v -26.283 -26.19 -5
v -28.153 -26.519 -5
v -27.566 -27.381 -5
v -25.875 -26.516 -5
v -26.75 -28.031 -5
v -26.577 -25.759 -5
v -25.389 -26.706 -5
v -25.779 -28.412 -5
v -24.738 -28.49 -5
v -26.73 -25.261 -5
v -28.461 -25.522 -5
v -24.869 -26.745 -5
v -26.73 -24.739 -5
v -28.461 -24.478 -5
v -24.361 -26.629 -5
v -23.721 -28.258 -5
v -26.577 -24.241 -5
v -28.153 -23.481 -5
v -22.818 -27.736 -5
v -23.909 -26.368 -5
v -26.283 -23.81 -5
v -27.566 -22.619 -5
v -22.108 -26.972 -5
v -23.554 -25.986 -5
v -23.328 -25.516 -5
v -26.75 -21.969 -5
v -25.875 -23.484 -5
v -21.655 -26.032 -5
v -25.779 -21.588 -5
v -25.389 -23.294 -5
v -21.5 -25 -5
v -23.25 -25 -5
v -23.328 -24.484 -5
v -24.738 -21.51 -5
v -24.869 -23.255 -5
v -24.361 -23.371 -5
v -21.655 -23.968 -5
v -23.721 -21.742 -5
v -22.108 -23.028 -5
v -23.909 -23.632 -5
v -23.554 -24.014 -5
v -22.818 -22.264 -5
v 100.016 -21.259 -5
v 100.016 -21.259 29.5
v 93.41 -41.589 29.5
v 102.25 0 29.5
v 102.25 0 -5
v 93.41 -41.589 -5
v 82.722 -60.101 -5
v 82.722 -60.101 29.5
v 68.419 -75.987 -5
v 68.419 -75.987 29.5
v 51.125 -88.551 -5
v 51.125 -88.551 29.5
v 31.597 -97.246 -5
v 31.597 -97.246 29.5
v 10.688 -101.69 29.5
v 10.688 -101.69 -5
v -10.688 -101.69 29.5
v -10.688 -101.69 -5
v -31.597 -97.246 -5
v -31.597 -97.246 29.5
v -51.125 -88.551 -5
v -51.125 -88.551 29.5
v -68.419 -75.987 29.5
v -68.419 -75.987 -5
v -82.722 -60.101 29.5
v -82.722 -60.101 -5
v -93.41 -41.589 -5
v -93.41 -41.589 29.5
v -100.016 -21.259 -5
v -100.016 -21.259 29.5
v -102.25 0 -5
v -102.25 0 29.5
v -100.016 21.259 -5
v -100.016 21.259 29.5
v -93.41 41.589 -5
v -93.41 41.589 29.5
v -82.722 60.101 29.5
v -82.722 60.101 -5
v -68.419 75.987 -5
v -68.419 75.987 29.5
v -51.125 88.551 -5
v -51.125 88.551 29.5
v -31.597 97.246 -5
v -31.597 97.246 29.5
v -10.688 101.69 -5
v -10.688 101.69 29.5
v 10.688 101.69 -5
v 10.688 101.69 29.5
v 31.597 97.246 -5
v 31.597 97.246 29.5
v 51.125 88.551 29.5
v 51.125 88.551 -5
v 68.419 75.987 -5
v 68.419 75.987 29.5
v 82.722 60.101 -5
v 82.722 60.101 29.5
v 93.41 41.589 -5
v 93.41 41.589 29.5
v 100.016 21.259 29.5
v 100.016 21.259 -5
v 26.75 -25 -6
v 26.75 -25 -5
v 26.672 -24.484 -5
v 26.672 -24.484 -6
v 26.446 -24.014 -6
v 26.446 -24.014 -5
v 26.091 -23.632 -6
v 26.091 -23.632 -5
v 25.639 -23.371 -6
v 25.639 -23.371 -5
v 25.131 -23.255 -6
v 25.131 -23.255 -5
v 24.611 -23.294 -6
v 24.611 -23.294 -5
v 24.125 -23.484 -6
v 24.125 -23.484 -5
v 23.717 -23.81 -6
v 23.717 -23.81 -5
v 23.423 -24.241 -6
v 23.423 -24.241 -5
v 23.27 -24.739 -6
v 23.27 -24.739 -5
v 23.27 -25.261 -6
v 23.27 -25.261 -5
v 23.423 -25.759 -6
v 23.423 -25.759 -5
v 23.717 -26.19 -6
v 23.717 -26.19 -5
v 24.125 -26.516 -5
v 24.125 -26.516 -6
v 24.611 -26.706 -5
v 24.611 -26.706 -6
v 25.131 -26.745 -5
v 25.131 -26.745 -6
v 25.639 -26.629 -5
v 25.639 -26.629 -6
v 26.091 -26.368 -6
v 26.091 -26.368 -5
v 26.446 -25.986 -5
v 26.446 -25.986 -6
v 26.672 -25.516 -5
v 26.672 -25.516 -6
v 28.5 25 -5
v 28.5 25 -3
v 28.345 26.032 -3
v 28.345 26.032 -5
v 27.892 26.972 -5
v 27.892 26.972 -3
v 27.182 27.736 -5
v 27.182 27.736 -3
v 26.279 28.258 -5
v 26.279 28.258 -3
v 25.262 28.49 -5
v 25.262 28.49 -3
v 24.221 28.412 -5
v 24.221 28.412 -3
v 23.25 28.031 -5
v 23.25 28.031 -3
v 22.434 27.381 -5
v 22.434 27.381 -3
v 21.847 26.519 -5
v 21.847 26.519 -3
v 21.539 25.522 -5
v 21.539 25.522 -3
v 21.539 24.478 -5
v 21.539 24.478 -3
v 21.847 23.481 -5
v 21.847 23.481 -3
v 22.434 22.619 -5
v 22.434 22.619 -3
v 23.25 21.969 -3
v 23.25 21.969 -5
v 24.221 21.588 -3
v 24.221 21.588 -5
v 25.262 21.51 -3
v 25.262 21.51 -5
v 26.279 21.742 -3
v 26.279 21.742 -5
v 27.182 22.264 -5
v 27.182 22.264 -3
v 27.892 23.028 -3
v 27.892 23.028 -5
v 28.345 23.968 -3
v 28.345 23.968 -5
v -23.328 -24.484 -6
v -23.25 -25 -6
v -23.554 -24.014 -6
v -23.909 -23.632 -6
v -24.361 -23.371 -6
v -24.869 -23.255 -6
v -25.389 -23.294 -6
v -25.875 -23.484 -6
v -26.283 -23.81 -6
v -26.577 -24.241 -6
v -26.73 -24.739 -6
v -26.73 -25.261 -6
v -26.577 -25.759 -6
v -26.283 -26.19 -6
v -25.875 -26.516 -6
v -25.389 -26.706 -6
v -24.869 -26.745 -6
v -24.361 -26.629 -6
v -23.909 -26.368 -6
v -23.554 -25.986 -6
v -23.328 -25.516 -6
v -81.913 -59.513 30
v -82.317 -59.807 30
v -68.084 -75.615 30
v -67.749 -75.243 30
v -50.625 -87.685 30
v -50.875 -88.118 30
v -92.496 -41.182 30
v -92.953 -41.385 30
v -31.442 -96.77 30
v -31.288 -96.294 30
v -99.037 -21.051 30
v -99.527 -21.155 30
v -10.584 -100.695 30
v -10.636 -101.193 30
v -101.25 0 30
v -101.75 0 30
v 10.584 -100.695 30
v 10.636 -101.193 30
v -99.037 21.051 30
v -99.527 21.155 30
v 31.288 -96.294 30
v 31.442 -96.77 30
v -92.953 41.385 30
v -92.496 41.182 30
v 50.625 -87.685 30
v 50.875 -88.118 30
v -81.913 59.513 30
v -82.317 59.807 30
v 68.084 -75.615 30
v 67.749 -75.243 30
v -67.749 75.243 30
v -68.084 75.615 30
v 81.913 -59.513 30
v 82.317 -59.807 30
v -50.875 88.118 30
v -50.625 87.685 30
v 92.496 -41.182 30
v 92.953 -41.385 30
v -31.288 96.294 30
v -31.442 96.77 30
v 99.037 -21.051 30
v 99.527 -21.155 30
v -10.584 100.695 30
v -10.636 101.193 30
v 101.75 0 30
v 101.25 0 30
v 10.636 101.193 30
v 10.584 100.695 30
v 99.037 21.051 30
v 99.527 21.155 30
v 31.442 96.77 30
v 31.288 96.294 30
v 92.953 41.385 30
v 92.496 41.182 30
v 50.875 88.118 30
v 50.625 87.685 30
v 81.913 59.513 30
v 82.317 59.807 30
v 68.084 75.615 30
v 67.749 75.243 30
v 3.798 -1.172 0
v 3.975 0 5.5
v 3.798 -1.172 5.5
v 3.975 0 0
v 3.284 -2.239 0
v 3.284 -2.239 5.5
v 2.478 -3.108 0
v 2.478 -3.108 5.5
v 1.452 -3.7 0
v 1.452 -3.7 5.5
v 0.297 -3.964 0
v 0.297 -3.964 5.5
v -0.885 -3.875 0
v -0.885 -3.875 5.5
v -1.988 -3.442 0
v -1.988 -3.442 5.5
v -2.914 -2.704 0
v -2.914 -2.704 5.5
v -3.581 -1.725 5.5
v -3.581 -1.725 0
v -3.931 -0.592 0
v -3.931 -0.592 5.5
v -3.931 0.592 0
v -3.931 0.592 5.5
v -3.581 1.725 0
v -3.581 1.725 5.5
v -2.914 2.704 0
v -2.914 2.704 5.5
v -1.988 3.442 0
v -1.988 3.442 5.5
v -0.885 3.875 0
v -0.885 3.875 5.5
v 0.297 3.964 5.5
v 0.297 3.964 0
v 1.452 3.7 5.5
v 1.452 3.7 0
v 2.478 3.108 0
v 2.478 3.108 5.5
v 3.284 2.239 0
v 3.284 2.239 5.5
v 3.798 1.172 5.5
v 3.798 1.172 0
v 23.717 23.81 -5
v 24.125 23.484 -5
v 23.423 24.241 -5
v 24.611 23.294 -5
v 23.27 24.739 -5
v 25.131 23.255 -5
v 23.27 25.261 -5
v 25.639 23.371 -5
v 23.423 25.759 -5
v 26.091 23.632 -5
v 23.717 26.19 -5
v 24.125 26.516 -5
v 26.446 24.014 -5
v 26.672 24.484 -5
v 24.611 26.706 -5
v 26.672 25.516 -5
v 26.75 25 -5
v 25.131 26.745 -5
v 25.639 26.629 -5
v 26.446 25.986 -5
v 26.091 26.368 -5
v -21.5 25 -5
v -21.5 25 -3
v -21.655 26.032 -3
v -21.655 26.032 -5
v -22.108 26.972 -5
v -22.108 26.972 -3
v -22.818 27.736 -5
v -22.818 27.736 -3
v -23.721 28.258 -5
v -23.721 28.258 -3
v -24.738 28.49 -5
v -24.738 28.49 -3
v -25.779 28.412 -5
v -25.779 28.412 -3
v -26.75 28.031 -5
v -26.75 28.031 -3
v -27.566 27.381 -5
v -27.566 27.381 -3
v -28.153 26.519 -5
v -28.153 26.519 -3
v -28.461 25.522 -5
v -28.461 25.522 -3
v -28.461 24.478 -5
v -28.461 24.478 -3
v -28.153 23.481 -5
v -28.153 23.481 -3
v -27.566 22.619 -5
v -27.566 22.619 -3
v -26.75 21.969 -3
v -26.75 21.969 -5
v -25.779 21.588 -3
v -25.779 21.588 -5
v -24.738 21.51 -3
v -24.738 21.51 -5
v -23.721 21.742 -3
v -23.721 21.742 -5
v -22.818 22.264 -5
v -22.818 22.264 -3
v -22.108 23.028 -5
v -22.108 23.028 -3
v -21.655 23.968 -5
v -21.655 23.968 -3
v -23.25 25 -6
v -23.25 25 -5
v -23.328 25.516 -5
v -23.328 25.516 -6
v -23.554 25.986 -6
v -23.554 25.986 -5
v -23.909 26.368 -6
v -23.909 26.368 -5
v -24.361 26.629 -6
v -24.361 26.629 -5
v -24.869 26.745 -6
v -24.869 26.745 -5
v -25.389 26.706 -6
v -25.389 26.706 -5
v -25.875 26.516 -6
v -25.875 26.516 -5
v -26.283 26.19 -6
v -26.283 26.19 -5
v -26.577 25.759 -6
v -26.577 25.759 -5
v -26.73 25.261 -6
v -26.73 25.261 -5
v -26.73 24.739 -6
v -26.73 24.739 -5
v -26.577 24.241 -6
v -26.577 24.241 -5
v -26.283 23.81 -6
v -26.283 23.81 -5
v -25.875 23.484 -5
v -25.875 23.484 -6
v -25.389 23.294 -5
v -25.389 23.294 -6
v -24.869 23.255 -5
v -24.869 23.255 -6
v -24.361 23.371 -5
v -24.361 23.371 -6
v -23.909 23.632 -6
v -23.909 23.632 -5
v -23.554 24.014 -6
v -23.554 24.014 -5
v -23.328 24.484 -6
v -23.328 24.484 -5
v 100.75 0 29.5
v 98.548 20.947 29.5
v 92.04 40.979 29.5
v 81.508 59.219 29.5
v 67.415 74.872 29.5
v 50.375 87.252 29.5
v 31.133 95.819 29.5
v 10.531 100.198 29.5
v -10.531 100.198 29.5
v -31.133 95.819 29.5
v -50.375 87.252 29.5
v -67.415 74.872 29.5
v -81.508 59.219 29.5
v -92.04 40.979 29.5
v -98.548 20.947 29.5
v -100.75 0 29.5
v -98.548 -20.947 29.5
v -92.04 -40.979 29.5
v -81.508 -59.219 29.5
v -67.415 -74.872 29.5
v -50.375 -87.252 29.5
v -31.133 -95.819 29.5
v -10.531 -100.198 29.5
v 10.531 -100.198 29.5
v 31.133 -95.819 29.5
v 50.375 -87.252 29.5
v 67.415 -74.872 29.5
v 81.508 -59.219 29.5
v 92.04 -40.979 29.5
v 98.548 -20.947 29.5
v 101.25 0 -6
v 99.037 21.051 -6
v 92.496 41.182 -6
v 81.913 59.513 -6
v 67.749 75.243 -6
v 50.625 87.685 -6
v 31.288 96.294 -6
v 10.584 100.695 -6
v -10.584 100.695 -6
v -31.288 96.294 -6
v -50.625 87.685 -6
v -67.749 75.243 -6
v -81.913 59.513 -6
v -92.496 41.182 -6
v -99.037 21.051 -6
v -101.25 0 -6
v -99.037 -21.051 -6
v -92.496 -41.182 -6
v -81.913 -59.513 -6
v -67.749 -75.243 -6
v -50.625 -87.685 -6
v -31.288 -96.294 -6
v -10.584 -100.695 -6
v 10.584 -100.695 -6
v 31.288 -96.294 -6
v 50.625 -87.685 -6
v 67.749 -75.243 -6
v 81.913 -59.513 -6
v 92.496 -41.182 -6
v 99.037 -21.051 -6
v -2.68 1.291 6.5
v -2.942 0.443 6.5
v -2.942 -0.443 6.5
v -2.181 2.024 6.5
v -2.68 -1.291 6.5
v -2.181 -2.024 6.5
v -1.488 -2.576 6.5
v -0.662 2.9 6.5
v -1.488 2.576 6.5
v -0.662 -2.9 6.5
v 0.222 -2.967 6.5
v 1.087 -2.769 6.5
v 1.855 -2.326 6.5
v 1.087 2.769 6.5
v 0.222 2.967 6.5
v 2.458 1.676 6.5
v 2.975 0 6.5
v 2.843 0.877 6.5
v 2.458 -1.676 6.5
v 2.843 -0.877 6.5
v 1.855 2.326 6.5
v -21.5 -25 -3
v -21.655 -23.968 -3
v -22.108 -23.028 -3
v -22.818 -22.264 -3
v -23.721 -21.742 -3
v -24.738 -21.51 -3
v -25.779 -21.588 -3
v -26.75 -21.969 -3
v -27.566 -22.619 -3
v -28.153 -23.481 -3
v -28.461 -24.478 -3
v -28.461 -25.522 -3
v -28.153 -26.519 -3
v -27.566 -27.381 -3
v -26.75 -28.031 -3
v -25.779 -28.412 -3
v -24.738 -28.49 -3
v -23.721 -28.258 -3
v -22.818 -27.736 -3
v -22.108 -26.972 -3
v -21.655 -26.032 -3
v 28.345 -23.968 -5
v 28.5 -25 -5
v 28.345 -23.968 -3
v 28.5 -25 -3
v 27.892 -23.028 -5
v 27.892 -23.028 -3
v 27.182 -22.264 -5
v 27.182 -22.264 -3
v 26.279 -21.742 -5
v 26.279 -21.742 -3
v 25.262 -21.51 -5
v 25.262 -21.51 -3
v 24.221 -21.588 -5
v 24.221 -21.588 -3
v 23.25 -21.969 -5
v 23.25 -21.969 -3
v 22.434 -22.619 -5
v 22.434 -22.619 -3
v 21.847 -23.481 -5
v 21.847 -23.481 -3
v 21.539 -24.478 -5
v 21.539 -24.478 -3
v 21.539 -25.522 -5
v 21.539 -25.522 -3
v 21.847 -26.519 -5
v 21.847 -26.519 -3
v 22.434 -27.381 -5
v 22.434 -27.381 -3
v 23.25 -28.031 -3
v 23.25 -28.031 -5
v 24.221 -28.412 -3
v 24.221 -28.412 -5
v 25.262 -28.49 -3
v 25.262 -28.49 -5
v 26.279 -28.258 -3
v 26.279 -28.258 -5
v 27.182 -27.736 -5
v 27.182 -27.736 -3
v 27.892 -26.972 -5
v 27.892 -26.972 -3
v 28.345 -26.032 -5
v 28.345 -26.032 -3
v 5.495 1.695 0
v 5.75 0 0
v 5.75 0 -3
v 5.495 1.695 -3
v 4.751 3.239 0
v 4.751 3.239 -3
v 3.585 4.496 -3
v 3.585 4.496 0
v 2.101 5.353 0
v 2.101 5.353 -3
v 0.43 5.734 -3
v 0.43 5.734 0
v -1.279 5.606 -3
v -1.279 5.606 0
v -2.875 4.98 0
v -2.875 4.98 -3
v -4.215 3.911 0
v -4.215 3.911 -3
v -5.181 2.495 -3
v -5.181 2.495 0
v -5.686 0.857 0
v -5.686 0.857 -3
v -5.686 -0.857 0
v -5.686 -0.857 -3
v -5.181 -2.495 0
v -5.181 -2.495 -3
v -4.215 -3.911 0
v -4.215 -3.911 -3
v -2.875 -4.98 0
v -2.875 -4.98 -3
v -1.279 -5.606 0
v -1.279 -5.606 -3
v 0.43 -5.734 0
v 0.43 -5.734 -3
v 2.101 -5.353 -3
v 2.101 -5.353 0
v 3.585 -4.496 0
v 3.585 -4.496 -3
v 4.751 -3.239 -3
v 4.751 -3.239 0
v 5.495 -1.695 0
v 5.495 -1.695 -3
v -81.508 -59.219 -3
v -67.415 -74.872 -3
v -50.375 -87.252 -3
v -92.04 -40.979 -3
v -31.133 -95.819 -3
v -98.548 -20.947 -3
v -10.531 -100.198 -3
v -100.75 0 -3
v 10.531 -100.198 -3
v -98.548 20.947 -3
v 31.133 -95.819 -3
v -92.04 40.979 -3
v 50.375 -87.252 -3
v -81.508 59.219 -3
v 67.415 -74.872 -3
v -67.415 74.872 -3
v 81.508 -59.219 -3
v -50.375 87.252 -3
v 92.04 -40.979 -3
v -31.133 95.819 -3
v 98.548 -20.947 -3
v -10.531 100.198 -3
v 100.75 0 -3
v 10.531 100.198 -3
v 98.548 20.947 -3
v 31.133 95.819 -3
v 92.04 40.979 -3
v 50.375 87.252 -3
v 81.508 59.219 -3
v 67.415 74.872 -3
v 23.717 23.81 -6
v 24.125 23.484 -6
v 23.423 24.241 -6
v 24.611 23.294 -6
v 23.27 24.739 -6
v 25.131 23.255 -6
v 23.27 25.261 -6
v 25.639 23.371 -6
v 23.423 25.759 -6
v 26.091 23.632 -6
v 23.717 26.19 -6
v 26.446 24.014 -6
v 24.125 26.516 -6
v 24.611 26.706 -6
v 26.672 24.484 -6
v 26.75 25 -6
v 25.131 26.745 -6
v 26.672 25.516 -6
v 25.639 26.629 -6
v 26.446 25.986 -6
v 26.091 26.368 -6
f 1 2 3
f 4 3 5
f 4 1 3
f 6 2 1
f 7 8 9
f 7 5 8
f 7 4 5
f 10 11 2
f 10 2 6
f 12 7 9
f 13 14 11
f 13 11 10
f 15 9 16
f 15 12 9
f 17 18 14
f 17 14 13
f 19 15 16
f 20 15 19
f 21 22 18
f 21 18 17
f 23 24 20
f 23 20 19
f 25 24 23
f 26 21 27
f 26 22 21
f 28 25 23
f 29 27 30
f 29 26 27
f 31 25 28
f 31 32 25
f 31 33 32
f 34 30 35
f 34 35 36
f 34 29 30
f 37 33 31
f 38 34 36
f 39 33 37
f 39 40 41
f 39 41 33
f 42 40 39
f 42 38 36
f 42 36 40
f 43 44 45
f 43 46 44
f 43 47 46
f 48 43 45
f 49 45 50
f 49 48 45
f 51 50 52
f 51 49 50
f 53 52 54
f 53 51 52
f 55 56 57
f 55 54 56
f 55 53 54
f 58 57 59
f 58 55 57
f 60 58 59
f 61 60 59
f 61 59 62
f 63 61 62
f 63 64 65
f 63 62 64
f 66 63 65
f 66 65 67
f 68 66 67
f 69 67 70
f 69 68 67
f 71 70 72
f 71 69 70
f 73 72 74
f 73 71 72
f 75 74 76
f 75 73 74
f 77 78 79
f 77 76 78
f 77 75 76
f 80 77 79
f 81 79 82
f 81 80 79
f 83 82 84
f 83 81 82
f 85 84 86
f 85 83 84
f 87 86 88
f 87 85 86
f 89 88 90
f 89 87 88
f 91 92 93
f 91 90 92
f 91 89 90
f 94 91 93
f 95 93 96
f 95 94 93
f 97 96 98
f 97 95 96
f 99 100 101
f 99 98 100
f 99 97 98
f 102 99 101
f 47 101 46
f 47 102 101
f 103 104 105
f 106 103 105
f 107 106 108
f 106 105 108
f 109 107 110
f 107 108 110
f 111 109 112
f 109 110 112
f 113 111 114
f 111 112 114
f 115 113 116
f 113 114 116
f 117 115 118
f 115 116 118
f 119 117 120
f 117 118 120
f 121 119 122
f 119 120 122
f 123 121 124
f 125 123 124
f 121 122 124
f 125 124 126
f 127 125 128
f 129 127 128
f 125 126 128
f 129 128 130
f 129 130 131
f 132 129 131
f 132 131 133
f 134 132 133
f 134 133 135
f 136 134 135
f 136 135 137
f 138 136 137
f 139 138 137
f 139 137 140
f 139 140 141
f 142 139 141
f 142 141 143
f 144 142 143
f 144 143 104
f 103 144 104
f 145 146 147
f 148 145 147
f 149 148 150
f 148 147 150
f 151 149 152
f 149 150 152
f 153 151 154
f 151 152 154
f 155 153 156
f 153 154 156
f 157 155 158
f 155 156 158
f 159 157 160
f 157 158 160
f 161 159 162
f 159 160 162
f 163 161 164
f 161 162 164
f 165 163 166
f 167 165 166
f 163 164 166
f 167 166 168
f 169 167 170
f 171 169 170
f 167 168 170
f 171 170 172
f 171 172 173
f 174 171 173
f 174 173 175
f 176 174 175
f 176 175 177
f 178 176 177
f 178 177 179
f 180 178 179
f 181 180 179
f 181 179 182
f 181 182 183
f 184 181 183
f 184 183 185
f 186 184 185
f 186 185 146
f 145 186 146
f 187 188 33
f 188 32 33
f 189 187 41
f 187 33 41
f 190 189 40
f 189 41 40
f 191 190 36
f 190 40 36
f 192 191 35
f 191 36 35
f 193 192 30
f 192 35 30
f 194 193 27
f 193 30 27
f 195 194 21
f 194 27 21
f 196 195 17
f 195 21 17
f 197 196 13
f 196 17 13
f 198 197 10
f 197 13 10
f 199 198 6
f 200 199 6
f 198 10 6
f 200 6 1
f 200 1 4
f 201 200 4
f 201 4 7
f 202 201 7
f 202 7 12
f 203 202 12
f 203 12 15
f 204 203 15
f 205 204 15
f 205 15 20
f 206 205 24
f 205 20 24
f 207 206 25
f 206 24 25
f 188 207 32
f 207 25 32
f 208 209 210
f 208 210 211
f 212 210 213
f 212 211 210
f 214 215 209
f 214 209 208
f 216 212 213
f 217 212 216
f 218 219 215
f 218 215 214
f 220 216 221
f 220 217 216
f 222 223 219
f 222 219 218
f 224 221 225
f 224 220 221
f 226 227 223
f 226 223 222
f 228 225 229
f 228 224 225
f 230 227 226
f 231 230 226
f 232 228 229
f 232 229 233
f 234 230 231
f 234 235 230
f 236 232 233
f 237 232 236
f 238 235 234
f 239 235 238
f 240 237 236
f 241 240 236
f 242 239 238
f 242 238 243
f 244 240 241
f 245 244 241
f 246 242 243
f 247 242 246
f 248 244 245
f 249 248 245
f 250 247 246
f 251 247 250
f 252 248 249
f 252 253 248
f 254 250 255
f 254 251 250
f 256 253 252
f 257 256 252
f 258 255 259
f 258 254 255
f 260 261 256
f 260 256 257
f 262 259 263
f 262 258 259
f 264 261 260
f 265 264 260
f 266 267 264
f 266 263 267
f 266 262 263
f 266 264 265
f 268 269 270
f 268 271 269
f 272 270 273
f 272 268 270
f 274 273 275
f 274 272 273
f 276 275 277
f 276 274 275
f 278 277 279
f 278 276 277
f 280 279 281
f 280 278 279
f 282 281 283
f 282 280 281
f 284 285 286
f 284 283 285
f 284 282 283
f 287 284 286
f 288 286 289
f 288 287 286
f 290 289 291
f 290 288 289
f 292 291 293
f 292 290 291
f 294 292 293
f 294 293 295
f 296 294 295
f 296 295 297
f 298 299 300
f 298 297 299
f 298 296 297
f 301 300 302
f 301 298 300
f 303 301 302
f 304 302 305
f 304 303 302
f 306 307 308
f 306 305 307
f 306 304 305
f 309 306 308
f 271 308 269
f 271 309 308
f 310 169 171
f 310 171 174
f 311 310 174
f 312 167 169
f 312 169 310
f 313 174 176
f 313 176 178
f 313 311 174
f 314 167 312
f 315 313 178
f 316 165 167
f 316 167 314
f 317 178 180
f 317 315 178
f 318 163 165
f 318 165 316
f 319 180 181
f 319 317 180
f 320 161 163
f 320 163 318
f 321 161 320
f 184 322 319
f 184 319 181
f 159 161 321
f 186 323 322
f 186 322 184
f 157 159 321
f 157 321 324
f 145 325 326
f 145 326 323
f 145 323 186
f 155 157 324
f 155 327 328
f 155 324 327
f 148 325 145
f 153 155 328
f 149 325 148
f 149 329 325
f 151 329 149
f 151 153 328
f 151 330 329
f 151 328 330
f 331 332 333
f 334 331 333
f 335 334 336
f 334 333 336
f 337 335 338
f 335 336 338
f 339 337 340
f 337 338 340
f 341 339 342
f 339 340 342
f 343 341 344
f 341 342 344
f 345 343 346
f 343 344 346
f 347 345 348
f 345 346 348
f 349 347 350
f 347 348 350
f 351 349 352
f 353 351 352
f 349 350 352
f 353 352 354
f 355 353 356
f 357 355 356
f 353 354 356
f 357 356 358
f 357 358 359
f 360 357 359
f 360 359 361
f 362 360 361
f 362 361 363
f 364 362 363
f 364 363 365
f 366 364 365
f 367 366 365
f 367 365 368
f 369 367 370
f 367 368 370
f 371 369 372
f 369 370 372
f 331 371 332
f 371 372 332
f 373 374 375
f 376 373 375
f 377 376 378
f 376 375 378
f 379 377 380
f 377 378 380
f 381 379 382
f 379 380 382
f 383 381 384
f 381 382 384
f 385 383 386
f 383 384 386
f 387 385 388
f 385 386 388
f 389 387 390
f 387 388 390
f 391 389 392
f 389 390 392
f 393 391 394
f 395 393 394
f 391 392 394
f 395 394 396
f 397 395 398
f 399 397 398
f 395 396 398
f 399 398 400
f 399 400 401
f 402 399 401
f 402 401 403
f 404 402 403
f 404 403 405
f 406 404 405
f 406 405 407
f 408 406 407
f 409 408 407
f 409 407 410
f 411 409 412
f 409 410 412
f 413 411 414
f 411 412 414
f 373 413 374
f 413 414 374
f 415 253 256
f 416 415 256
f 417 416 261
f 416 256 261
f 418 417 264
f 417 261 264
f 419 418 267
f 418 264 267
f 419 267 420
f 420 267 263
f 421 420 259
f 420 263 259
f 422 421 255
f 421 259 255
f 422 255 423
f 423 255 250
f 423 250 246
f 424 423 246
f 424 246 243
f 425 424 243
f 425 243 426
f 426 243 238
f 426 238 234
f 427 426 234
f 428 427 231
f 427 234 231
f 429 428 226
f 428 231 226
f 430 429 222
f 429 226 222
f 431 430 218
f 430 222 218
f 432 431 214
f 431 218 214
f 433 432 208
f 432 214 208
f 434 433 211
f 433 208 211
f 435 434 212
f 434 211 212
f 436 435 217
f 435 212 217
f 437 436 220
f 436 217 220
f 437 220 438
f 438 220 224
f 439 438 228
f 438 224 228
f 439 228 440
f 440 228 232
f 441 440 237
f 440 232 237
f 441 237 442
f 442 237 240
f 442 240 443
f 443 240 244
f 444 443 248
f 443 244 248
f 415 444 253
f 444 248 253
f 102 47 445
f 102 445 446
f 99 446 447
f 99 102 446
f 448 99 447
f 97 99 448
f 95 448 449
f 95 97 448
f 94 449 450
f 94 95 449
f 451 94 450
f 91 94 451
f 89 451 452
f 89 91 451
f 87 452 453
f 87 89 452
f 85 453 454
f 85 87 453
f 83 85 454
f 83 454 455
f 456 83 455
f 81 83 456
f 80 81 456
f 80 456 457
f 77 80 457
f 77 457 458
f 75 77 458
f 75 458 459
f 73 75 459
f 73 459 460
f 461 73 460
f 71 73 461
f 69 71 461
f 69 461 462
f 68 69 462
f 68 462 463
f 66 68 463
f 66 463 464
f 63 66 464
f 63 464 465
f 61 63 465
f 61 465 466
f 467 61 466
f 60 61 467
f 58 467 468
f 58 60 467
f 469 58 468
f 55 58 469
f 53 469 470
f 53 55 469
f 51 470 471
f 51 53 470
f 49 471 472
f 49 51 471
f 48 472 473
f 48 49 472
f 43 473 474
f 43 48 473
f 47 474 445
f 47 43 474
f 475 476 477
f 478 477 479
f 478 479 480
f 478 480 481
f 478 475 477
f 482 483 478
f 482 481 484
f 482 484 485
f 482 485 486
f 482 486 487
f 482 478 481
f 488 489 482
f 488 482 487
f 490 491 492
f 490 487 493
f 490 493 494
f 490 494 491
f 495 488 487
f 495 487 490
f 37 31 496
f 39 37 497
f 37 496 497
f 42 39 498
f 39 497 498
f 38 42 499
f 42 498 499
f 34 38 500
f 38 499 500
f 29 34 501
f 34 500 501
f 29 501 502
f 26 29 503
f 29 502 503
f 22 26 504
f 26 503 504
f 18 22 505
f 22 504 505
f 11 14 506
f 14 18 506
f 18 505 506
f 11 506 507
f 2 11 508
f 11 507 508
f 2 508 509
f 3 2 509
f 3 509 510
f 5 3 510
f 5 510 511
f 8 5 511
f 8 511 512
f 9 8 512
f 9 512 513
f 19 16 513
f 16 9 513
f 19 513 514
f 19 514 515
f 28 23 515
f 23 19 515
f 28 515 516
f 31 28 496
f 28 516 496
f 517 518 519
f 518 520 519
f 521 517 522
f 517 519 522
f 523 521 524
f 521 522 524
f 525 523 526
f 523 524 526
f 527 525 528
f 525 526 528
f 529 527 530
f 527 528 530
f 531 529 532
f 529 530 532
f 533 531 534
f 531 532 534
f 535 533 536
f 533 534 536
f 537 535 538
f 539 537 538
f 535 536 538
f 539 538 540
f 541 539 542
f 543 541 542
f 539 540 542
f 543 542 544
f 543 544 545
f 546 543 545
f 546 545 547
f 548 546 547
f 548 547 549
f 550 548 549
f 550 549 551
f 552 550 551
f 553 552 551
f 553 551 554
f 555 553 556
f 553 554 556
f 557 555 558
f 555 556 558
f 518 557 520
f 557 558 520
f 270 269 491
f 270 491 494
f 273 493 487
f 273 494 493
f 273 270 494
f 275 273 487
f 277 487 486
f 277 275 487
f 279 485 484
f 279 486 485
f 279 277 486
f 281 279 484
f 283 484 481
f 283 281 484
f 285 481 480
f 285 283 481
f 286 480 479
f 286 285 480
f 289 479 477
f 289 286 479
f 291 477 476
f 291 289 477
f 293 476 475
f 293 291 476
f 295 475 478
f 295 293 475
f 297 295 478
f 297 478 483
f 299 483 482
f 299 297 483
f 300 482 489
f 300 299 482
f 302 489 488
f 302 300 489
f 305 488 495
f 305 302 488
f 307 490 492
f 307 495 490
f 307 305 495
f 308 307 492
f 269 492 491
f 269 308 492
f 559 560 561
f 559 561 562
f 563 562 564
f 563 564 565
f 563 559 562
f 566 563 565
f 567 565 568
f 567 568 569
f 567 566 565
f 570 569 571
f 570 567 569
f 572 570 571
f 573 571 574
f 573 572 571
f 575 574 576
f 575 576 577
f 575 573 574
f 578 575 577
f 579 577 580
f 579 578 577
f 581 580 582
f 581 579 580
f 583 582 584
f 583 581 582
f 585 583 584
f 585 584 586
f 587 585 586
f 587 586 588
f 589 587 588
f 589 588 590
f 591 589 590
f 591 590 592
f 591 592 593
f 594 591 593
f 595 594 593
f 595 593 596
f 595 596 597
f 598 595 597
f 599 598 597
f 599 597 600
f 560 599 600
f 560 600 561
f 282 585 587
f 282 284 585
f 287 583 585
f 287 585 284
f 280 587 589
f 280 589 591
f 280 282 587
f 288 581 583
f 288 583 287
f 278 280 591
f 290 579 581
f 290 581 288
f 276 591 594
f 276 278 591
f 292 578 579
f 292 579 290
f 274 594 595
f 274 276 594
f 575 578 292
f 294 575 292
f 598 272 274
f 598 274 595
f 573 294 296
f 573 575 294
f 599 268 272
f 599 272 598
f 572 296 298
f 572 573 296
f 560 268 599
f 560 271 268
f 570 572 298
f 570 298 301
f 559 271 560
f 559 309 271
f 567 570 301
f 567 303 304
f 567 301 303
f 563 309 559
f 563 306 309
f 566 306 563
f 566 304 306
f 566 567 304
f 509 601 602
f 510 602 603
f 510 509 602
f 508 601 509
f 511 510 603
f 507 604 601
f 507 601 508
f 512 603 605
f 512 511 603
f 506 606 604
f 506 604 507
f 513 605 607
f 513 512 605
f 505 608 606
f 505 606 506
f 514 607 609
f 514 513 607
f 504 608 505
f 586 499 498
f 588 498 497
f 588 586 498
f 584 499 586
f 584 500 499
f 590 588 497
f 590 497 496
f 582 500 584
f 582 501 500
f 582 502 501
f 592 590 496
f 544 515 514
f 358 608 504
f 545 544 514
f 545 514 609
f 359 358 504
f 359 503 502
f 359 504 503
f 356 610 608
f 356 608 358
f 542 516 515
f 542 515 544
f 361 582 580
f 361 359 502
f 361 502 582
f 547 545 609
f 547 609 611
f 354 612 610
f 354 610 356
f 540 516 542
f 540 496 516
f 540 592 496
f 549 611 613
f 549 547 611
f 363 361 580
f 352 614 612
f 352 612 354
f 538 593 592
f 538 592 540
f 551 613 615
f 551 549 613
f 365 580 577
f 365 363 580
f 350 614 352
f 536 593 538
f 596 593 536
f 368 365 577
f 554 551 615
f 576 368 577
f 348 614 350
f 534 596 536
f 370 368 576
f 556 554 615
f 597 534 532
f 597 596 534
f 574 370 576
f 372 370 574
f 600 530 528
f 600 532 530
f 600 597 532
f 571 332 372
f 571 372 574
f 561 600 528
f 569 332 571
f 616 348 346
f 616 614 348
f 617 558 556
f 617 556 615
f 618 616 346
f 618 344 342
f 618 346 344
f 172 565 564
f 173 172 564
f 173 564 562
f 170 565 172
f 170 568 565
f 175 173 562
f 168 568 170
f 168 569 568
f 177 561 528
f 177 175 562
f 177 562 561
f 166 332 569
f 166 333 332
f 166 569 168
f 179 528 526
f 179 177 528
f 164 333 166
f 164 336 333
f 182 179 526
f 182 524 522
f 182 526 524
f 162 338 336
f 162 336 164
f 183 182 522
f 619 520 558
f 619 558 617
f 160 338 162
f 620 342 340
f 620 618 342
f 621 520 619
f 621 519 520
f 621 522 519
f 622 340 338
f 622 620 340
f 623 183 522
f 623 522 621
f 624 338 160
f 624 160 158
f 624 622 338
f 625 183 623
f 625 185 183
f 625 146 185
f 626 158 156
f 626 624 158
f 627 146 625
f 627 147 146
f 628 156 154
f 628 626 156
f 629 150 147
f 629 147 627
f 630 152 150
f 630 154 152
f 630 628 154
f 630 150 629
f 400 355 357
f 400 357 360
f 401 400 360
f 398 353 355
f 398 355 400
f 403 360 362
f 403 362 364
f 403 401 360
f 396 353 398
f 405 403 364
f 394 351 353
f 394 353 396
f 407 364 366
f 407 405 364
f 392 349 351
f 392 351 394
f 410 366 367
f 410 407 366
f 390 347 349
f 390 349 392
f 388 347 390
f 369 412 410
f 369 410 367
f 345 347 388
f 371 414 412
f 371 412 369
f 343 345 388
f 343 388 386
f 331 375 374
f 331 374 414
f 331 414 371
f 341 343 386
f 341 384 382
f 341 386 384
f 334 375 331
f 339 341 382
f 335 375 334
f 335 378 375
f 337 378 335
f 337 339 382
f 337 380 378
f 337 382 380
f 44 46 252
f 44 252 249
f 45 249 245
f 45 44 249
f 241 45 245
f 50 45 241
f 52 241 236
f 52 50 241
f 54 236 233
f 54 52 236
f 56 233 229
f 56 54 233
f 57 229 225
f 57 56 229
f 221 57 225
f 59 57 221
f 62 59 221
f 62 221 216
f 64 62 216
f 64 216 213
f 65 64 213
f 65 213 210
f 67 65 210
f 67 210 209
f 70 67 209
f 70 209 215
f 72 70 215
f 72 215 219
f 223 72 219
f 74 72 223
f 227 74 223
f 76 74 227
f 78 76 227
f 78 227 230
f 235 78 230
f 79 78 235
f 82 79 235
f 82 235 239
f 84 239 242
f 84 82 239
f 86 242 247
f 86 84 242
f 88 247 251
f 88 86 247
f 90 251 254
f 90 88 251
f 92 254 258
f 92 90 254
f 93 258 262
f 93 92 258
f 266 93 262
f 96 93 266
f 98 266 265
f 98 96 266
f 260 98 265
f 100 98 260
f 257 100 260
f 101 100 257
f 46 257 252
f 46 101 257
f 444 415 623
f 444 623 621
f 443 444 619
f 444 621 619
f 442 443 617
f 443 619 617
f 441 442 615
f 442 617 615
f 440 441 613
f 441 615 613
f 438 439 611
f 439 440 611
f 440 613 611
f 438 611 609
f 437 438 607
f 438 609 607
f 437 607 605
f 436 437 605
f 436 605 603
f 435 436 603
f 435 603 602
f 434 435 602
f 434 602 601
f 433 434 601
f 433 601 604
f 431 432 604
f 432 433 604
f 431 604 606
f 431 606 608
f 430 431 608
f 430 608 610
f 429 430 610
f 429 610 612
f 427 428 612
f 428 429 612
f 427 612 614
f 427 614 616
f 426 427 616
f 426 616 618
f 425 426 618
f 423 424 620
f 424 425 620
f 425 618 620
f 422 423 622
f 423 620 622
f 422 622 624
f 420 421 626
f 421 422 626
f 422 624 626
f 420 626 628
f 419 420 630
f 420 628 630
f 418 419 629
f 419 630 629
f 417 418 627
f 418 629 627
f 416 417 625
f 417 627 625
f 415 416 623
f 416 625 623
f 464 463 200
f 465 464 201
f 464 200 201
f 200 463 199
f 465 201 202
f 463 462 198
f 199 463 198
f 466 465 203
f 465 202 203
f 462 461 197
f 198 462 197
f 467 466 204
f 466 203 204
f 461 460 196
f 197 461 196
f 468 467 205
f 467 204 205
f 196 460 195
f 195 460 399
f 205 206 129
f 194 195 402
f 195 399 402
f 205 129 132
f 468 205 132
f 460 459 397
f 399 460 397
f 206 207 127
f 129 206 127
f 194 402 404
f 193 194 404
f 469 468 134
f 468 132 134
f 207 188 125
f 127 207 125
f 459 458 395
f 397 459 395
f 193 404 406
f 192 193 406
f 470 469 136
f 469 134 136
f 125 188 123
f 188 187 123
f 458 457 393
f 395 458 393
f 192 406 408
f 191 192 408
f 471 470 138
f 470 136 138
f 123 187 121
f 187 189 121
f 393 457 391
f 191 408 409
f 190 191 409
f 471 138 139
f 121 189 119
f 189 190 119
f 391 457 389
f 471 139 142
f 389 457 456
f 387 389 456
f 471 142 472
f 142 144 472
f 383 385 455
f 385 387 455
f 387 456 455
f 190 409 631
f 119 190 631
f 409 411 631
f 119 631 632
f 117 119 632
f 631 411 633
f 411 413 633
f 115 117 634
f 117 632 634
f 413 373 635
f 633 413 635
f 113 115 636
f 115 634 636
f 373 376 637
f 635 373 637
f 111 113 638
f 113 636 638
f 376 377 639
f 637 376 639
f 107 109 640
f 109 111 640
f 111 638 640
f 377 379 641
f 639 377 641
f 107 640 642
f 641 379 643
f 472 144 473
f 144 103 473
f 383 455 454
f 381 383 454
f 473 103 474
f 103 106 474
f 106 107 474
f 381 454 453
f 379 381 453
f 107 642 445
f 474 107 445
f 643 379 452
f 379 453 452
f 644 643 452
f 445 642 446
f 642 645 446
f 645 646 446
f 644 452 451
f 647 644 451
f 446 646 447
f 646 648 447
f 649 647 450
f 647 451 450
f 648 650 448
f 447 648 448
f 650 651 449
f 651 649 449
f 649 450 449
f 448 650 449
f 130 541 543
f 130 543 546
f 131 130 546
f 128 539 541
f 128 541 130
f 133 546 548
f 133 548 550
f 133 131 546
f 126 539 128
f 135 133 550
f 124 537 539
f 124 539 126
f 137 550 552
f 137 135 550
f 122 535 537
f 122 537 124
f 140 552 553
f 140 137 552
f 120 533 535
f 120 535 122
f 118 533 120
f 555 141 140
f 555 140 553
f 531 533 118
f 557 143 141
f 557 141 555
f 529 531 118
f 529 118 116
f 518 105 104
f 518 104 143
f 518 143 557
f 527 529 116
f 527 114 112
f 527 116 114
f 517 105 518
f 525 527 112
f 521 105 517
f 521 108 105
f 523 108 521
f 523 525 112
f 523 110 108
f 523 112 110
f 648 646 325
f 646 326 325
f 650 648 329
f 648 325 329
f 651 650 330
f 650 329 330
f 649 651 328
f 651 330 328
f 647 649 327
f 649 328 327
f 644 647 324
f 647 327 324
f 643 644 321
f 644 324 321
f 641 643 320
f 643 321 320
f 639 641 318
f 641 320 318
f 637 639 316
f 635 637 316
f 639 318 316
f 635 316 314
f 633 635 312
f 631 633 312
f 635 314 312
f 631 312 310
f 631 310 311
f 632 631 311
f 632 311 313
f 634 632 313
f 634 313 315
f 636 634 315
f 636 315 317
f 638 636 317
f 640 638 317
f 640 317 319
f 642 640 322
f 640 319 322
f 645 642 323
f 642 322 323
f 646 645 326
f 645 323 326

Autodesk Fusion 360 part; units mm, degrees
sketch "Sketch1" plane through (0, 0, 0) normal (0, 0, 1) x (1, 0, 0)
  circle A0 centre (0, 0) radius 5.75
  circle A1 centre (0, 0) radius 100.75
  circle A2 centre (0, 0) radius 3.975
  circle A3 centre (0, 0) radius 102.25
  line L0 (-25, -25) -> (25, -25)
  line L1 (25, -25) -> (25, 25)
  line L2 (25, 25) -> (-25, 25)
  line L3 (-25, 25) -> (-25, -25)
  line L4 (-25, -25) -> (25, 25) construction
  line L5 (25, -25) -> (-25, 25) construction
  circle A4 centre (25, -25) radius 3.5
  circle A5 centre (-25, -25) radius 3.5
  circle A6 centre (25, 25) radius 3.5
  circle A7 centre (-25, 25) radius 3.5
  circle A8 centre (-25, -25) radius 1.75
  circle A9 centre (-25, 25) radius 1.75
  circle A10 centre (25, 25) radius 1.75
  circle A11 centre (25, -25) radius 1.75
  dimension "d1" = 11.5
  dimension "d2" = 201.5
  dimension "d3" = 7.95
  dimension "d11" = 204.5
  dimension "d24" = 50
  dimension "d25" = 50
  dimension "d26" = 7
  dimension "d27" = 7
  dimension "d28" = 7
  dimension "d29" = 7
  dimension "d30" = 3.5
  dimension "d31" = 3.5
  dimension "d32" = 3.5
  dimension "d33" = 3.5
extrude "Extrude1" add sketch "Sketch1" along normal blind 6.5 contours A2
extrude "Extrude2" add sketch "Sketch1" against normal blind 3 contours A0 | A2
extrude "Extrude3" add sketch "Sketch1" against normal blind 3 from surface at -3 contours A0 | A1 | A2 | L0 L3 A8 | L0 L3 A8 | L0 L3 A5 A8 | L0 L3 A5 A8 | L0 L1 L2 L3 A4 A5 A6 A7 | L0 L1 A4 A11 | L0 L1 A4 A11 | L2 L3 A7 A9 | L2 L3 A7 A9 | L0 L1 A11 | L0 L1 A11 | L2 L3 A9 | L2 L3 A9 | L1 L2 A6 A10 | L1 L2 A6 A10 | L1 L2 A10 | L1 L2 A10
extrude "Extrude4" add sketch "Sketch1" along normal blind 68 from surface at -6 contours A3
chamfer "Chamfer1" distance 1 angle 45 1 edges at (-3.706, -1.4374, 6.5)
chamfer "Chamfer2" distance 0.5 angle 45 2 edges at (-95.3305, -36.9752, 62) (-93.932, 36.4328, 62)
chamfer "Chamfer3" distance 1 angle 45 1 edges at (-95.3305, -36.9752, -6)
extrude "Extrude6" cut sketch "Sketch1" against normal blind 15 contours L0 L3 A8 | L0 L3 A8 | L0 L1 A11 | L0 L1 A11 | L2 L3 A9 | L2 L3 A9 | L1 L2 A10 | L1 L2 A10
extrude "Extrude7" cut sketch "Sketch1" against normal blind 5 contours L0 L3 A5 A8 | L0 L3 A5 A8 | L0 L1 A4 A11 | L0 L1 A4 A11 | L2 L3 A7 A9 | L2 L3 A7 A9 | L1 L2 A6 A10 | L1 L2 A6 A10
extrude "Extrude9" cut sketch "Sketch1" along normal blind 45 from surface at 30 contours A3
chamfer "Chamfer4" distance 0.5 angle 45 2 edges at (-93.932, -36.4328, 30) (-95.3305, 36.9752, 30)
